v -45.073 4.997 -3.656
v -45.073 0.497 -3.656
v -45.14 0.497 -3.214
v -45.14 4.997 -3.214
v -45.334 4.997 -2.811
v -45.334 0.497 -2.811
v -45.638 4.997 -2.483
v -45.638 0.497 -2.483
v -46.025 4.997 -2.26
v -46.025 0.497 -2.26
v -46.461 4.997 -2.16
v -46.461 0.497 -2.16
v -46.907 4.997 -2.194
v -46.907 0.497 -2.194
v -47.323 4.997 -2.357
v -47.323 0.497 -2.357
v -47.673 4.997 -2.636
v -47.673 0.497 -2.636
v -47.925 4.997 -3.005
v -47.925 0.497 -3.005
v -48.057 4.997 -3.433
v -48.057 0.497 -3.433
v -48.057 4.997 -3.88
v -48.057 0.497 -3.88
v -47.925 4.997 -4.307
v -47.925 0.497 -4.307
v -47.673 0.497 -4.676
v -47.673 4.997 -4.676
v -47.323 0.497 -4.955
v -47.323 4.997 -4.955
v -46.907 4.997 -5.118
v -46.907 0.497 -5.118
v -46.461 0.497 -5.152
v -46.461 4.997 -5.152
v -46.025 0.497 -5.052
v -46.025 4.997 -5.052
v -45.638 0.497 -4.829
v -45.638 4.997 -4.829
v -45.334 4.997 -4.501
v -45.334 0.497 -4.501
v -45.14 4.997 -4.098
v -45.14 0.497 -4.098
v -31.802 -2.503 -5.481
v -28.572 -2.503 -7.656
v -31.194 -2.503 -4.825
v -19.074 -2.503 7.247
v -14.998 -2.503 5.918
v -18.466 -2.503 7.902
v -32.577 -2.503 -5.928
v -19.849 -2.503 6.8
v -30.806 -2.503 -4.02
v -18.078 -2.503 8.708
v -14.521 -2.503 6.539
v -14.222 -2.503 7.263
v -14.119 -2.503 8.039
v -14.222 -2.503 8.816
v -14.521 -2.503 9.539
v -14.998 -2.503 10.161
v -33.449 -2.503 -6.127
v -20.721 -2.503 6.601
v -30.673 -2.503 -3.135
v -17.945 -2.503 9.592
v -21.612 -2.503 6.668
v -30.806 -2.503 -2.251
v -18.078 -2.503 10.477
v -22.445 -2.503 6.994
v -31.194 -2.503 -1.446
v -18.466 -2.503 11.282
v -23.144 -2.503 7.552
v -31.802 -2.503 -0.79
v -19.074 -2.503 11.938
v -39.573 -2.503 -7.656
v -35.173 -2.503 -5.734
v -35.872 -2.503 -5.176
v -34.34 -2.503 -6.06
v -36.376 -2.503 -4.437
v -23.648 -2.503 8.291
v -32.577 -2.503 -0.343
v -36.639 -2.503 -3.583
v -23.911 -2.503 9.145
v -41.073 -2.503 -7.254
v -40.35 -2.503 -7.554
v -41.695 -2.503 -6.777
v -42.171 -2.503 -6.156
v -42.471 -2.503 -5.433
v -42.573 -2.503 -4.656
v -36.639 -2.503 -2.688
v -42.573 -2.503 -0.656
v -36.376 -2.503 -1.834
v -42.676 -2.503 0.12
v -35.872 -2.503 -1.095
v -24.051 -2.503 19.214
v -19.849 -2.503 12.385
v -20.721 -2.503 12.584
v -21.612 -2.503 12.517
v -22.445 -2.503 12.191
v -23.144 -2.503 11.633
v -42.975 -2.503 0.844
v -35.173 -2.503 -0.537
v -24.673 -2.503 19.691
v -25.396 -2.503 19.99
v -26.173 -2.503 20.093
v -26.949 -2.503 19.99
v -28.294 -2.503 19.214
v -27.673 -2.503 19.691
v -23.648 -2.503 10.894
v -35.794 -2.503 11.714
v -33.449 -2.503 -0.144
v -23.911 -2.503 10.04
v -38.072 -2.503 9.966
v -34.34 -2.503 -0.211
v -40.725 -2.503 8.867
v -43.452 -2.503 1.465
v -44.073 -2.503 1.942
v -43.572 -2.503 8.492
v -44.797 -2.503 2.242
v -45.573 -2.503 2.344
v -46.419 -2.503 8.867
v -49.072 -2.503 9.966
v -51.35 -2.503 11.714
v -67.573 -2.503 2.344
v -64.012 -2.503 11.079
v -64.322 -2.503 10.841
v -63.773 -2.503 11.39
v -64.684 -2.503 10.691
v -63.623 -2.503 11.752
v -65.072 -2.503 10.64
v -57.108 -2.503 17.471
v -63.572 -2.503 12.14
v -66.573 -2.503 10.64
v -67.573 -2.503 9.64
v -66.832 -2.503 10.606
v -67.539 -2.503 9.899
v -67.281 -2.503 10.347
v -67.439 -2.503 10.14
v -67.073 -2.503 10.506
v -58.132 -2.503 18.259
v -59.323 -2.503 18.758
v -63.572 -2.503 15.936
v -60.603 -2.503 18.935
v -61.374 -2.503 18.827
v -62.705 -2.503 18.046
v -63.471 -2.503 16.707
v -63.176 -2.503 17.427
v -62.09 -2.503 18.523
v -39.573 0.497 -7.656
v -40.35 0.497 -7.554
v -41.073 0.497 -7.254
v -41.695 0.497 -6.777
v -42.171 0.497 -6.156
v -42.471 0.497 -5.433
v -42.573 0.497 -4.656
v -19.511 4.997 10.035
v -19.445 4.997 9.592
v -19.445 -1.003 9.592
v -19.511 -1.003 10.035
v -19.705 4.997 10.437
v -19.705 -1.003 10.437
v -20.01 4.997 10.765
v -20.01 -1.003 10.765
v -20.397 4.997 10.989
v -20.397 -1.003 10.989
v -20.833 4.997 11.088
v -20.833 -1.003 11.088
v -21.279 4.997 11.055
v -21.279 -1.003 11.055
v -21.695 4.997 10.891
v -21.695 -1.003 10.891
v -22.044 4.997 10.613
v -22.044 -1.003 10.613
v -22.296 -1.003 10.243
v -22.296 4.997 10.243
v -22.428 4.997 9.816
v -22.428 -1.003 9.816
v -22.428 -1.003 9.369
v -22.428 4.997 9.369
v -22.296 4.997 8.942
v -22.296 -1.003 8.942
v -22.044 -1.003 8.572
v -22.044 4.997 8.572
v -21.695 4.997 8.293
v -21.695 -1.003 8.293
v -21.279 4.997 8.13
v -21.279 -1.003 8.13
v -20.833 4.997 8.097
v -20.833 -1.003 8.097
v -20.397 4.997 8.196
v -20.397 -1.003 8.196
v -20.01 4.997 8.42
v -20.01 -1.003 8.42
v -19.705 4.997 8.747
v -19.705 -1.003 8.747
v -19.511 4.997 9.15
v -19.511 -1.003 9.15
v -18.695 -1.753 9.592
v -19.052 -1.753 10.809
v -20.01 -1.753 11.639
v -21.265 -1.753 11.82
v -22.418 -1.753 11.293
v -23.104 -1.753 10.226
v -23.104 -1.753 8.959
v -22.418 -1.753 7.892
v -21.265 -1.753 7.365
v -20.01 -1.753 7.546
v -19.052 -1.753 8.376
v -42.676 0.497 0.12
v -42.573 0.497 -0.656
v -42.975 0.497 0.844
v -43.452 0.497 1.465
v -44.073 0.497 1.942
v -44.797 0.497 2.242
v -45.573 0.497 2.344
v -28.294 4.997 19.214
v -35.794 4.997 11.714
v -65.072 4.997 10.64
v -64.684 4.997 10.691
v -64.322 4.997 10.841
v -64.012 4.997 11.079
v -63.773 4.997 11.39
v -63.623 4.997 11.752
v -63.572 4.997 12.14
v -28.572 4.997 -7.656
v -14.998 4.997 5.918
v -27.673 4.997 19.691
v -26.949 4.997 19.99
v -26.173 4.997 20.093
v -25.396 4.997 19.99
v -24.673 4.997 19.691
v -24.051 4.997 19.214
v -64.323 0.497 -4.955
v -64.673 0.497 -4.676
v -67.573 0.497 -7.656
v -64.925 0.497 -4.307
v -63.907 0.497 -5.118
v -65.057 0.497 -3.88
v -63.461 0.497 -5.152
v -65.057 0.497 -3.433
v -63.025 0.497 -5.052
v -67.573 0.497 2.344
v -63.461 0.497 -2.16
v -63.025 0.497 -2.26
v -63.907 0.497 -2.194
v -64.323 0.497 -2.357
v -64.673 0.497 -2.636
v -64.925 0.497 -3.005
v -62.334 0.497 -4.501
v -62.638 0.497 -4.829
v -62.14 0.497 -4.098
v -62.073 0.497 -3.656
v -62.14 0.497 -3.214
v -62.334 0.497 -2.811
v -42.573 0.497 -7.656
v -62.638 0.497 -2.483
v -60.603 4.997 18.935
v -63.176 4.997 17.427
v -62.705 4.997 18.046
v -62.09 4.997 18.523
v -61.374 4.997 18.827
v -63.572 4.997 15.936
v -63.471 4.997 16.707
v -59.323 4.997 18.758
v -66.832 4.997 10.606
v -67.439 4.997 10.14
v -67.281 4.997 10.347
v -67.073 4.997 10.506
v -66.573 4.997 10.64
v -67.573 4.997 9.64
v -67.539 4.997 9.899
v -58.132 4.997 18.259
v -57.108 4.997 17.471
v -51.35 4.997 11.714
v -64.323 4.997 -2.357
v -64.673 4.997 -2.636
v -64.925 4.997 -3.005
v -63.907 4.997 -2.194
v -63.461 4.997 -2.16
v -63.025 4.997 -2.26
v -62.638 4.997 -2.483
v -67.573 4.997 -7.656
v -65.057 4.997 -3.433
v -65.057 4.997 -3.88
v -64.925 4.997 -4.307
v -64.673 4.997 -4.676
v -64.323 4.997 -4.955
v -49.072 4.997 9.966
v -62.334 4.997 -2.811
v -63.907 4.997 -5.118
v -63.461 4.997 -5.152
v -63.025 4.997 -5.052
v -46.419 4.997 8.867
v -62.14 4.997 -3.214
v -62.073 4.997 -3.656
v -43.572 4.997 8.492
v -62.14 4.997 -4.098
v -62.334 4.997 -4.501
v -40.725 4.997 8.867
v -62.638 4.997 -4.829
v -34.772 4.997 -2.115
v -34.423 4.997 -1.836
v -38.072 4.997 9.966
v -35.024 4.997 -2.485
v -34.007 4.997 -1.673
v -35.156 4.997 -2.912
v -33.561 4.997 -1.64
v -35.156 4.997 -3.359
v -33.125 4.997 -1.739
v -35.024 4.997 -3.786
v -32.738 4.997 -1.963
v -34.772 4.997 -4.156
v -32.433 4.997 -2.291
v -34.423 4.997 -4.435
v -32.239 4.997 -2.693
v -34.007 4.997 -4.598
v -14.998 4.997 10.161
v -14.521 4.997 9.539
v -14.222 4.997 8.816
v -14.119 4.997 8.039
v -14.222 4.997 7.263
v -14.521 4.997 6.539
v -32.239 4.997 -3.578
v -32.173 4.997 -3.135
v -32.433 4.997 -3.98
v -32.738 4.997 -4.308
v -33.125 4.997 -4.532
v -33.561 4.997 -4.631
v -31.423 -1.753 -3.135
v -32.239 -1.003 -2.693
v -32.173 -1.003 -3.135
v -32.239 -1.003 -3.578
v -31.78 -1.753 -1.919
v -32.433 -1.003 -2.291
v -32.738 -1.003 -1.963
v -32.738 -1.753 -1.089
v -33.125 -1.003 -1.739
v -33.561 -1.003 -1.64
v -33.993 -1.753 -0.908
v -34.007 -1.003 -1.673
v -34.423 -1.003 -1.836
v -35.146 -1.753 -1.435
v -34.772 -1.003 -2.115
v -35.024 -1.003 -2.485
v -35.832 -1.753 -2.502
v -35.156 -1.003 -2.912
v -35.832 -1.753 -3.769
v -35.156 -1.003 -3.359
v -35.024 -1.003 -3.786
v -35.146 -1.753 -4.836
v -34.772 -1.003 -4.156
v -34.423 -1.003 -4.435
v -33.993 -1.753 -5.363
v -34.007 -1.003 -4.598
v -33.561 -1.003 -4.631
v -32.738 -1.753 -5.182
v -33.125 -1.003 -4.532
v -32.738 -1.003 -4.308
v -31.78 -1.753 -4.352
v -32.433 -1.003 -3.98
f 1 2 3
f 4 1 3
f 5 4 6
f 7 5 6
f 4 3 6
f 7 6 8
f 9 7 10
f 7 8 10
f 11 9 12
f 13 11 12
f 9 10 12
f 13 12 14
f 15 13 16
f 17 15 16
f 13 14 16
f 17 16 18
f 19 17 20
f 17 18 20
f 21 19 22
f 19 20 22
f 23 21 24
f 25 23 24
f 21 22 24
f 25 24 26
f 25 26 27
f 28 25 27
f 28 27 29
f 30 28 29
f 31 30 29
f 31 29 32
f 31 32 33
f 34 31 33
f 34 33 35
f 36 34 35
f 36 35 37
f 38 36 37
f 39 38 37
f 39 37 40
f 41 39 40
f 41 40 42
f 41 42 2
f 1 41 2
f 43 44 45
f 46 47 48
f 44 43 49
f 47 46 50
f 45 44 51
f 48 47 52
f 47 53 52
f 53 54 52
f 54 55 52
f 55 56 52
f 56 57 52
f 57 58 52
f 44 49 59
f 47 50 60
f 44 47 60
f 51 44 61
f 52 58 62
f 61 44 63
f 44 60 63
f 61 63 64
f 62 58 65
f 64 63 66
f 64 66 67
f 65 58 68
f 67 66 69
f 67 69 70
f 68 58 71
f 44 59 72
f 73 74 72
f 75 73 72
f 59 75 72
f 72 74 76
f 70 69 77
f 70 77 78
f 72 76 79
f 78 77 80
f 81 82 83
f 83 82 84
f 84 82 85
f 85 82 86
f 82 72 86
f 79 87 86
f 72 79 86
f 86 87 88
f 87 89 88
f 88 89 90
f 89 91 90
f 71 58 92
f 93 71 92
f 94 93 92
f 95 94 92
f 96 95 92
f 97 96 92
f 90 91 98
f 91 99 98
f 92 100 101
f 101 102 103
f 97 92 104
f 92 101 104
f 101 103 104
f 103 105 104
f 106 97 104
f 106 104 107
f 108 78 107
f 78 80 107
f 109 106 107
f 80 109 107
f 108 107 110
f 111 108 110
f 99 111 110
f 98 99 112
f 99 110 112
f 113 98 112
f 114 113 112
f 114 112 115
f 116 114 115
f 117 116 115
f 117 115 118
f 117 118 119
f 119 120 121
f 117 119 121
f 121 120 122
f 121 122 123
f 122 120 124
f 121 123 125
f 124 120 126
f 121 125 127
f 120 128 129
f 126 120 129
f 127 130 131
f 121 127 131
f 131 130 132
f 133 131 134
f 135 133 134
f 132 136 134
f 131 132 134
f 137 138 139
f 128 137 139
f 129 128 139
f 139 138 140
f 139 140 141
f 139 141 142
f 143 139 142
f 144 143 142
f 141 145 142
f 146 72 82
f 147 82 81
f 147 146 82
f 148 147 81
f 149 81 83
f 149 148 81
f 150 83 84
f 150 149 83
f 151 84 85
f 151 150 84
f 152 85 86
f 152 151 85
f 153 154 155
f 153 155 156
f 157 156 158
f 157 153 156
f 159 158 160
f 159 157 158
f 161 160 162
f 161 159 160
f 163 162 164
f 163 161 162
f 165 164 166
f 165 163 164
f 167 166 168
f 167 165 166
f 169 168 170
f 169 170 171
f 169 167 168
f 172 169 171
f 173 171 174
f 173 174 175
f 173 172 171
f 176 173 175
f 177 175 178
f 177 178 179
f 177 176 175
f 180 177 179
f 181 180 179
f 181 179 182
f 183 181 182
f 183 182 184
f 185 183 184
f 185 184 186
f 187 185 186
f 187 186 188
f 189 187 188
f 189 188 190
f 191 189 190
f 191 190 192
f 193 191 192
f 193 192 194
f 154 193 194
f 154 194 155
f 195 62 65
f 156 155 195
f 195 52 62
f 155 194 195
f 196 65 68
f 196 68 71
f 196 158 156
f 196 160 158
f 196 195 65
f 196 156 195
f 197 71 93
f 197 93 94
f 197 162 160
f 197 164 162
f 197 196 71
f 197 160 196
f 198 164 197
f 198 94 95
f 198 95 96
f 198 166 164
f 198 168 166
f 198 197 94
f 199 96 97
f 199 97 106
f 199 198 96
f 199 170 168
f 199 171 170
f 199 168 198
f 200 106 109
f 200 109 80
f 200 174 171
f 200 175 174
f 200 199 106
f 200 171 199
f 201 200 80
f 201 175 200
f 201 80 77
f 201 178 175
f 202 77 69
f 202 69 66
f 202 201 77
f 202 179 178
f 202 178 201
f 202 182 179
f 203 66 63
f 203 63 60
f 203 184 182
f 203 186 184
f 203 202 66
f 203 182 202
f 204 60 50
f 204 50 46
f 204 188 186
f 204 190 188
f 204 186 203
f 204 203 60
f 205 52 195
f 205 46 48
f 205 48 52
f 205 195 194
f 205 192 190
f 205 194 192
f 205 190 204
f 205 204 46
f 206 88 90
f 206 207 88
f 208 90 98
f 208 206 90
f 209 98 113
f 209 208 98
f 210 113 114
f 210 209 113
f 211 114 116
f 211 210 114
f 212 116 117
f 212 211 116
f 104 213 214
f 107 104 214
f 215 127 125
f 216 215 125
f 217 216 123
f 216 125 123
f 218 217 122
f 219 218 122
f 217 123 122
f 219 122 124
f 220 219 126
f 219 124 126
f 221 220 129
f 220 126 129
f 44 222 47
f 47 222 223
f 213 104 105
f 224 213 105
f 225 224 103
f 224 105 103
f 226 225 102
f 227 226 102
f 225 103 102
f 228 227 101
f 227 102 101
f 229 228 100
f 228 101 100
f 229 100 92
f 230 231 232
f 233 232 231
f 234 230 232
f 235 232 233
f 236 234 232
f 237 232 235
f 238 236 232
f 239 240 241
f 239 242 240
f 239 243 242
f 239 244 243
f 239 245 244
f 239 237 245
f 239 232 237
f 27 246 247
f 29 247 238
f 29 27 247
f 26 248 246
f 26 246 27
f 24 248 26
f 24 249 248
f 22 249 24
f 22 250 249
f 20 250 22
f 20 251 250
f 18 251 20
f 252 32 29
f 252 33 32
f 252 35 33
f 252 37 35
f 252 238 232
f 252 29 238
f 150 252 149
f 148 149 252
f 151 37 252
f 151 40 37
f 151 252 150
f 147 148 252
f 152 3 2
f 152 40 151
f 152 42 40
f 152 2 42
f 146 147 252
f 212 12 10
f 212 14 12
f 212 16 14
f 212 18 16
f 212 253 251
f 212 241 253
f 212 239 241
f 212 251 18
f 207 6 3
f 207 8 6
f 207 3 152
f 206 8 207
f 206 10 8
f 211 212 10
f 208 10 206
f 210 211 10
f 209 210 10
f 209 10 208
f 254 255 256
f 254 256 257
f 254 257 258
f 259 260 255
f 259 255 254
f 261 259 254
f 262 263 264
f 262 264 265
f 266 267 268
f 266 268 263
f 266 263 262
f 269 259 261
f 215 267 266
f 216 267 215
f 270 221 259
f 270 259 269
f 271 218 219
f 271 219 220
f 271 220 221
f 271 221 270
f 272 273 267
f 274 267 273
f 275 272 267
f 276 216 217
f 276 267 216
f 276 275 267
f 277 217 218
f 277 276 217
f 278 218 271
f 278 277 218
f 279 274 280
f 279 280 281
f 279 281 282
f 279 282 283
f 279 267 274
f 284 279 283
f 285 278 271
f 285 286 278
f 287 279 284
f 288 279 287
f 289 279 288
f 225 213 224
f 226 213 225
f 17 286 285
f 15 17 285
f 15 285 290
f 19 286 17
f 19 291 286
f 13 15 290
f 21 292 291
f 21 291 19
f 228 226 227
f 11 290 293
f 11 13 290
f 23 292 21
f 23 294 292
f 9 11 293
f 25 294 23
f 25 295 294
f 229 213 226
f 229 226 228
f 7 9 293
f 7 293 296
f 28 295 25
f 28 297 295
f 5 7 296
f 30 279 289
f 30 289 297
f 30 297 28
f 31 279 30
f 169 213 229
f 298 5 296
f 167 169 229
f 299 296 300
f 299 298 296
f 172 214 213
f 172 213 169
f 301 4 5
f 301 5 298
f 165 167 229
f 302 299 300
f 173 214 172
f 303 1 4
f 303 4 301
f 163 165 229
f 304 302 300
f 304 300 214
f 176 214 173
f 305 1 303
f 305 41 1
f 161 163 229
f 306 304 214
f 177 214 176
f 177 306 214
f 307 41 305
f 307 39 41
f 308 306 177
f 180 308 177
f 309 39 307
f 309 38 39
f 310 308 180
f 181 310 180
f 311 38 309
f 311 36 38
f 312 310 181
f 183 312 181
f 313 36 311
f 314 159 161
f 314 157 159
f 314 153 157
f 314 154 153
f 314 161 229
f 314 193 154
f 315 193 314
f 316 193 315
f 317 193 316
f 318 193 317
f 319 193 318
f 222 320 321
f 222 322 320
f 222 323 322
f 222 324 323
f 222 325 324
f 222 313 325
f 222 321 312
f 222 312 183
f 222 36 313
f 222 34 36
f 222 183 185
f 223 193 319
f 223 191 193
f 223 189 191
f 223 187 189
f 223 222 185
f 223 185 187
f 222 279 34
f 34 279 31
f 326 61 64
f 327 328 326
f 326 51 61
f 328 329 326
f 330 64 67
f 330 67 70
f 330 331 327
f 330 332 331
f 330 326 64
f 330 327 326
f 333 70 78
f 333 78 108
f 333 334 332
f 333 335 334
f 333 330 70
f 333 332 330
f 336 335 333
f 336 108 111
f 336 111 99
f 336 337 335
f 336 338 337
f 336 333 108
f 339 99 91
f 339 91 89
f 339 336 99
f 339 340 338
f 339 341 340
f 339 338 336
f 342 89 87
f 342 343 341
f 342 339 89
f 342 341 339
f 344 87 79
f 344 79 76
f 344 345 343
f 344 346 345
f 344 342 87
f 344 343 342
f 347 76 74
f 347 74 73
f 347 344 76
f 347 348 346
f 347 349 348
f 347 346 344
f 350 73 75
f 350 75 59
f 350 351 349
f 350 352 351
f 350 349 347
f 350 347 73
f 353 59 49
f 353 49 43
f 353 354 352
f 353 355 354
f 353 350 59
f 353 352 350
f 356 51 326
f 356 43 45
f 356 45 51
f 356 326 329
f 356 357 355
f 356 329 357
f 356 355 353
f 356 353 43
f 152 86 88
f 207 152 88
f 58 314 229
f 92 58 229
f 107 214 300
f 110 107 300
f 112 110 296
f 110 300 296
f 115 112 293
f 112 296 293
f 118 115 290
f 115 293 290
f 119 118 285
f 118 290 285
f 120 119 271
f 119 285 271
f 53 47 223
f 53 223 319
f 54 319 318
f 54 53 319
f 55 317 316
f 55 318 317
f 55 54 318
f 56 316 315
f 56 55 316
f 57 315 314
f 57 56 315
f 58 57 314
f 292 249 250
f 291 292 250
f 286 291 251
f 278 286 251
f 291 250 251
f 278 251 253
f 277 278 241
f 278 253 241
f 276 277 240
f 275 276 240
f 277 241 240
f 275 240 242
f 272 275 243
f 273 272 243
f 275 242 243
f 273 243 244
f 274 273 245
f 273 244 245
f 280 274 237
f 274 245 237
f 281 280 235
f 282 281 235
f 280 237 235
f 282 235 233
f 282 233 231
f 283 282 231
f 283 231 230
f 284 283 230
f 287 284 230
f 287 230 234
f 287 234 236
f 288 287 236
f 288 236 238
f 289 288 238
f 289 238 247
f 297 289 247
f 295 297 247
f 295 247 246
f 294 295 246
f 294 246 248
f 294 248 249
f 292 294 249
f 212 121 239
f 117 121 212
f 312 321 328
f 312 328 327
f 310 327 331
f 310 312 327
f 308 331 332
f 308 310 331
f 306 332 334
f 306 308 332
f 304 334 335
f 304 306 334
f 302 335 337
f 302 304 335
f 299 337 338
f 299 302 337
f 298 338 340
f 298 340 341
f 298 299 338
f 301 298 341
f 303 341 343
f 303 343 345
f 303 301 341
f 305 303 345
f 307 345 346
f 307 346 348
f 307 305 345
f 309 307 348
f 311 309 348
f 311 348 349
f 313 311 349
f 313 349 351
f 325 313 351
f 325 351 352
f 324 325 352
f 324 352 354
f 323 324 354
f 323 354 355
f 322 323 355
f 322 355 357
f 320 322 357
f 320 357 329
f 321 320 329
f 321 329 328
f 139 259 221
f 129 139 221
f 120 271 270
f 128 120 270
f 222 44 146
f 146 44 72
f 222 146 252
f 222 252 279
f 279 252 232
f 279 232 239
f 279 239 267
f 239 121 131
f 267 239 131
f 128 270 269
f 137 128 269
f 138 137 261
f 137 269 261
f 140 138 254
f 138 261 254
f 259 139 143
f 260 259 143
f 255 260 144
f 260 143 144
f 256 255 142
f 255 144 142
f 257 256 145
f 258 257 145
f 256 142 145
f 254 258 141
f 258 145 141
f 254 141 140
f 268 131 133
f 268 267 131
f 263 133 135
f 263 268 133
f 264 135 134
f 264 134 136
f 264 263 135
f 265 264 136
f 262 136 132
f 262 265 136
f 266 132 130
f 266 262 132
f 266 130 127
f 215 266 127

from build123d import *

# Parameters (mm, degrees)
SKETCH3_R           = 1.5
BOSS_EXTRUDE1_DEPTH = 8
BOSS_EXTRUDE2_DEPTH = 8
BOSS_EXTRUDE3_DEPTH = 20
SKETCH10_R          = 7.5
SKETCH10_R_2        = 5
BOSS_EXTRUDE4_DEPTH = 10
FILLET1_R           = 3
CUT_EXTRUDE1_DEPTH  = 0.5
CUT_EXTRUDE2_START  = -0.5
CUT_EXTRUDE2_DEPTH  = 0.5
CHAMFER1_SIZE       = 3
SKETCH13_W          = 9.116659412
SKETCH13_H          = 8
BOSS_EXTRUDE5_DEPTH = 21
FILLET2_R           = 15
FILLET3_R           = 5
BOSS_EXTRUDE6_DEPTH = 7.5
SKETCH15_W          = 25
SKETCH15_H          = 10.000000005
CUT_EXTRUDE3_DEPTH  = 3
SKETCH17_W          = 25
SKETCH17_H          = 10.000000005
CUT_EXTRUDE4_DEPTH  = 3
FILLET4_R           = 3
SKETCH18_R          = 1.5
CUT_EXTRUDE5_DEPTH  = 36
SKETCH19_W          = 63.521473438
SKETCH19_H          = 44.294667312
CUT_EXTRUDE6_DEPTH  = 28.5
CHAMFER2_SIZE       = 1.5
FILLET5_R           = 1


with BuildPart() as part:
    # Sketch3 → Boss-Extrude1 (new body)
    with BuildSketch(Plane.XZ.offset(-5.496710387)):
        with BuildLine():
            Line((-58.572275019, 18.935598634), (-63.572275019, 18.935598634))
            Line((-63.572275019, 18.935598634), (-63.572275019, 5.639753178))
            Line((-63.572275019, 5.639753178), (-58.572275019, -7.656092278))
            Line((-58.572275019, -7.656092278), (-28.572248892, -7.656092278))
            Line((-28.572248892, -7.656092278), (-12.876703256, 8.039453359))
            Line((-12.876703256, 8.039453359), (-26.172535648, 21.335285751))
            Line((-26.172535648, 21.335285751), (-35.794074299, 11.7137471))
            ThreePointArc((-35.794074299, 11.7137471), (-43.572248892, 8.491921693), (-51.350423485, 11.7137471))
            Line((-51.350423485, 11.7137471), (-58.572275019, 18.935598634))
        make_face()
        with Locations((-33.672753955, -3.135495305)):
            Circle(SKETCH3_R, mode=Mode.SUBTRACT)
        with Locations((-20.944831894, 9.592426757)):
            Circle(SKETCH3_R, mode=Mode.SUBTRACT)
    extrude(amount=BOSS_EXTRUDE1_DEPTH)



with BuildPart() as body_2:
    # Sketch4 → Boss-Extrude2 (new body)
    with BuildSketch(Plane(origin=(0, 25.496710387, 0), x_dir=(1, 0, 0), z_dir=(0, 1, 0))):
        with BuildLine():
            Line((-65.072275019, -10.639753178), (-67.573393534, -10.639753178))
            Line((-67.573393534, -10.639753178), (-67.573393534, 7.656092278))
            Line((-67.573393534, 7.656092278), (-28.572248892, 7.656092278))
            Line((-28.572248892, 7.656092278), (-12.876703256, -8.039453359))
            Line((-12.876703256, -8.039453359), (-26.172535648, -21.335285751))
            Line((-26.172535648, -21.335285751), (-35.794074299, -11.7137471))
            ThreePointArc((-35.794074299, -11.7137471), (-43.572248892, -8.491921693), (-51.350423485, -11.7137471))
            Line((-51.350423485, -11.7137471), (-58.572275019, -18.935598634))
            Line((-58.572275019, -18.935598634), (-63.572275019, -18.935598634))
            Line((-63.572275019, -18.935598634), (-63.572275019, -12.139753178))
            ThreePointArc((-63.572275019, -12.139753178), (-64.011614847, -11.079093006), (-65.072275019, -10.639753178))
        make_face()
    extrude(amount=BOSS_EXTRUDE2_DEPTH)


with BuildPart() as part_1:
    add(part.part)

    add(body_2.part)  # Boss-Extrude3 merges body 2
    # Sketch9 → Boss-Extrude3 (add)
    with BuildSketch(Plane.XZ.offset(-25.496710387)):
        Polygon((-34.709554416, -7.656092278), (-42.709554416, 0.343907722), (-58.456734122, 0.343907722), (-58.456734122, -7.656092278), align=None)
    extrude(amount=BOSS_EXTRUDE3_DEPTH)

    # Sketch10 → Boss-Extrude4 (add)
    with BuildSketch(Plane(origin=(0, 0, -7.656092278), x_dir=(-1, 0, 0), z_dir=(0, 0, -1))):
        with Locations(Location((43.572275019, 15.496710387, 0), (0, 0, 180))):
            Circle(SKETCH10_R)
        with Locations((43.572275019, 15.496710387)):
            Circle(SKETCH10_R_2, mode=Mode.SUBTRACT)
    extrude(amount=BOSS_EXTRUDE4_DEPTH)

    # Fillet1
    fillet1_edges = [part_1.edges().sort_by_distance(p)[0] for p in [
        (-63.572275019, 1.496710387, 18.935598634),
        (-26.172535648, 1.496710387, 21.335285751),
        (-12.876703256, 1.496710387, 8.039453359),
        (-63.572275019, 29.496710387, 18.935598634),
        (-26.172535648, 29.496710387, 21.335285751),
        (-12.876703256, 29.496710387, 8.039453359),
    ]]
    fillet(fillet1_edges, radius=FILLET1_R)

    # Sketch11 → Cut-Extrude1 (cut)
    with BuildSketch(Plane.XZ.offset(-25.496710387)):
        with BuildLine():
            Line((-58.572275019, 18.935598634), (-60.572275019, 18.935598634))
            ThreePointArc((-60.572275019, 18.935598634), (-62.693595362, 18.056918977), (-63.572275019, 15.935598634))
            Line((-63.572275019, 15.935598634), (-63.572275019, 12.139753178))
            ThreePointArc((-63.572275019, 12.139753178), (-64.011614847, 11.079093006), (-65.072275019, 10.639753178))
            Line((-65.072275019, 10.639753178), (-67.573393534, 10.639753178))
            Line((-67.573393534, 10.639753178), (-67.573393534, -7.656092278))
            Line((-67.573393534, -7.656092278), (-58.456734122, -7.656092278))
            Line((-58.456734122, -7.656092278), (-58.456734122, 0.343907722))
            Line((-58.456734122, 0.343907722), (-42.709554416, 0.343907722))
            Line((-42.709554416, 0.343907722), (-34.709554416, -7.656092278))
            Line((-34.709554416, -7.656092278), (-28.572248892, -7.656092278))
            Line((-28.572248892, -7.656092278), (-14.998023599, 5.918133015))
            ThreePointArc((-14.998023599, 5.918133015), (-14.119343943, 8.039453359), (-14.998023599, 10.160773702))
            Line((-14.998023599, 10.160773702), (-24.051215304, 19.213965408))
            ThreePointArc((-24.051215304, 19.213965408), (-26.172535648, 20.092645064), (-28.293855992, 19.213965408))
            Line((-28.293855992, 19.213965408), (-35.794074299, 11.7137471))
            ThreePointArc((-35.794074299, 11.7137471), (-43.572248892, 8.491921693), (-51.350423485, 11.7137471))
            Line((-51.350423485, 11.7137471), (-58.572275019, 18.935598634))
        make_face()
    extrude(amount=-CUT_EXTRUDE1_DEPTH, mode=Mode.SUBTRACT)

    # Sketch12 → Cut-Extrude2 (cut)
    with BuildSketch(Plane(origin=(0, 5.496710387, 0), x_dir=(1, 0, 0), z_dir=(0, 1, 0)).offset(CUT_EXTRUDE2_START)):
        with BuildLine():
            Line((-67.573393534, -10.639753178), (-65.072275019, -10.639753178))
            ThreePointArc((-65.072275019, -10.639753178), (-64.011614847, -11.079093006), (-63.572275019, -12.139753178))
            Line((-63.572275019, -12.139753178), (-63.572275019, -15.935598634))
            ThreePointArc((-63.572275019, -15.935598634), (-62.693595362, -18.056918977), (-60.572275019, -18.935598634))
            Line((-60.572275019, -18.935598634), (-58.572275019, -18.935598634))
            Line((-58.572275019, -18.935598634), (-51.350423485, -11.7137471))
            ThreePointArc((-51.350423485, -11.7137471), (-43.572248892, -8.491921693), (-35.794074299, -11.7137471))
            Line((-35.794074299, -11.7137471), (-28.293855992, -19.213965408))
            ThreePointArc((-28.293855992, -19.213965408), (-26.172535648, -20.092645064), (-24.051215304, -19.213965408))
            Line((-24.051215304, -19.213965408), (-14.998023599, -10.160773702))
            ThreePointArc((-14.998023599, -10.160773702), (-14.119343943, -8.039453359), (-14.998023599, -5.918133015))
            Line((-14.998023599, -5.918133015), (-28.572248892, 7.656092278))
            Line((-28.572248892, 7.656092278), (-34.709554416, 7.656092278))
            Line((-34.709554416, 7.656092278), (-42.709554416, -0.343907722))
            Line((-42.709554416, -0.343907722), (-58.456734122, -0.343907722))
            Line((-58.456734122, -0.343907722), (-58.456734122, 7.656092278))
            Line((-58.456734122, 7.656092278), (-58.572275019, 7.656092278))
            Line((-58.572275019, 7.656092278), (-62.841209361, -3.695725977))
            ThreePointArc((-62.841209361, -3.695725977), (-63.941577707, -5.106321482), (-65.64921959, -5.639753178))
            Line((-65.64921959, -5.639753178), (-67.573393534, 7.656092278))
            Line((-67.573393534, 7.656092278), (-67.573393534, -10.639753178))
        make_face()
    extrude(amount=CUT_EXTRUDE2_DEPTH, mode=Mode.SUBTRACT)

    # Chamfer1
    # the kernel refuses this chamfer: 3 mm, written as the material it adds along each edge
    with BuildSketch(Plane(origin=(-43.572275019, 15.496710387, -7.656092278), x_dir=(1, 0, 0), z_dir=(0, 1, 0))) as chamfer1_piece_1_section:
        Polygon((7.5 + CHAMFER1_SIZE, 0), (7.5, CHAMFER1_SIZE), (7.5, 0), align=None)
    chamfer1_piece_1 = revolve(axis=Axis((-43.572275019, 15.496710387, -7.656092278), (0, 0, -1)), mode=Mode.PRIVATE)
    chamfer1_piece_1 = split(chamfer1_piece_1, bisect_by=Plane(origin=(-42.890914717, 15.496710387, 0.525268024), z_dir=(-0.7071067811865474, 0, -0.7071067811865477)), keep=Keep.TOP, mode=Mode.PRIVATE)
    add(chamfer1_piece_1)

    # Sketch13 → Boss-Extrude5 (add)
    with BuildSketch(Plane.XZ.offset(-25.996710387)):
        with Locations((-63.015063828, -3.656092278)):
            Rectangle(SKETCH13_W, SKETCH13_H)
    extrude(amount=BOSS_EXTRUDE5_DEPTH)

    # Fillet2
    fillet2_edges = [part_1.edges().sort_by_distance(p)[0] for p in [
        (-63.572275019, 1.246710387, 5.639753178),
    ]]
    fillet(fillet2_edges, radius=FILLET2_R)

    # Fillet3
    # the kernel refuses this fillet: 5 mm, written as the material it takes off along each edge
    with BuildSketch(Plane(origin=(-58.572275019, 20.819040858, 18.935598634), x_dir=(0.7071067811865416, 0, -0.7071067811865536), z_dir=(0, 1, 0)), Plane(origin=(-58.572275019, 10.174379917, 18.935598634), x_dir=(-1, 0, 0), z_dir=(0, -1, 0))) as fillet3_piece_1:
        with BuildLine():
            CenterArc((FILLET3_R * 0.414213562373, FILLET3_R), FILLET3_R, 225, 45)
            Line((-FILLET3_R * 0.292893218813, FILLET3_R * 0.292893218813), (-FILLET3_R * 0.307035354437, FILLET3_R * 0.27875108319))
            Line((-FILLET3_R * 0.307035354437, FILLET3_R * 0.27875108319), (-FILLET3_R * 0.00828427124746, -FILLET3_R * 0.02))
            Line((-FILLET3_R * 0.00828427124746, -FILLET3_R * 0.02), (FILLET3_R * 0.414213562373, -FILLET3_R * 0.02))
            Line((FILLET3_R * 0.414213562373, -FILLET3_R * 0.02), (FILLET3_R * 0.414213562373, 0))
        make_face()
    extrude(amount=17.855339059, mode=Mode.SUBTRACT)

    # Sketch14 → Boss-Extrude6 (add)
    with BuildSketch(Plane.XZ.offset(2.503289613)):
        with BuildLine():
            Line((-62.612326164, 3.087086856), (-58.572275019, -7.656092278))
            Line((-58.572275019, -7.656092278), (-67.573393534, -7.656092278))
            Line((-67.573393534, -7.656092278), (-67.573393534, 10.639753178))
            Line((-67.573393534, 10.639753178), (-65.072275019, 10.639753178))
            ThreePointArc((-65.072275019, 10.639753178), (-64.011614847, 11.079093006), (-63.572275019, 12.139753178))
            Line((-63.572275019, 12.139753178), (-63.572275019, 8.366950853))
            ThreePointArc((-63.572275019, 8.366950853), (-63.330336666, 5.683740759), (-62.612326164, 3.087086856))
        make_face()
    extrude(amount=-BOSS_EXTRUDE6_DEPTH)

    # Sketch15 → Cut-Extrude3 (cut)
    with BuildSketch(Plane.XZ.offset(2.503289613)):
        with Locations((-55.073393534, -2.656092276)):
            Rectangle(SKETCH15_W, SKETCH15_H)
    extrude(amount=-CUT_EXTRUDE3_DEPTH, mode=Mode.SUBTRACT)

    # Sketch17 → Cut-Extrude4 (cut)
    with BuildSketch(Plane(origin=(0, 33.496710387, 0), x_dir=(1, 0, 0), z_dir=(0, 1, 0))):
        with Locations((-55.073393534, 2.656092276)):
            Rectangle(SKETCH17_W, SKETCH17_H)
    extrude(amount=-CUT_EXTRUDE4_DEPTH, mode=Mode.SUBTRACT)

    # Fillet4
    fillet4_edges = [part_1.edges().sort_by_distance(p)[0] for p in [
        (-42.573393534, -1.003289613, 2.343907727),
        (-42.573393534, -1.003289613, -7.656092278),
        (-42.573393534, 31.996710387, 2.343907727),
        (-42.573393534, 31.996710387, -7.656092278),
    ]]
    fillet(fillet4_edges, radius=FILLET4_R)

    # Sketch18 → Cut-Extrude5 (cut)
    with BuildSketch(Plane.XZ.offset(2.503289613)):
        with Locations((-46.573393534, -3.65609228)):
            Circle(SKETCH18_R)
        with Locations((-63.573393534, -3.656092278)):
            Circle(SKETCH18_R)
    extrude(amount=-CUT_EXTRUDE5_DEPTH, mode=Mode.SUBTRACT)

    # Sketch19 → Cut-Extrude6 (cut)
    with BuildSketch(Plane(origin=(0, 33.496710387, 0), x_dir=(1, 0, 0), z_dir=(0, 1, 0))):
        with Locations((-40.836204684, -1.568816282)):
            Rectangle(SKETCH19_W, SKETCH19_H)
    extrude(amount=-CUT_EXTRUDE6_DEPTH, mode=Mode.SUBTRACT)

    # Chamfer2
    chamfer2_edges = [part_1.edges().sort_by_distance(p)[0] for p in [
        (-35.172753955, -2.503289613, -3.135495305),
        (-22.444831894, -2.503289613, 9.592426757),
    ]]
    chamfer(chamfer2_edges, length=CHAMFER2_SIZE)

    # Fillet5
    fillet5_edges = [part_1.edges().sort_by_distance(p)[0] for p in [
        (-67.573393534, 1.246710387, 10.639753178),
    ]]
    fillet(fillet5_edges, radius=FILLET5_R)


solid = part_1.part
